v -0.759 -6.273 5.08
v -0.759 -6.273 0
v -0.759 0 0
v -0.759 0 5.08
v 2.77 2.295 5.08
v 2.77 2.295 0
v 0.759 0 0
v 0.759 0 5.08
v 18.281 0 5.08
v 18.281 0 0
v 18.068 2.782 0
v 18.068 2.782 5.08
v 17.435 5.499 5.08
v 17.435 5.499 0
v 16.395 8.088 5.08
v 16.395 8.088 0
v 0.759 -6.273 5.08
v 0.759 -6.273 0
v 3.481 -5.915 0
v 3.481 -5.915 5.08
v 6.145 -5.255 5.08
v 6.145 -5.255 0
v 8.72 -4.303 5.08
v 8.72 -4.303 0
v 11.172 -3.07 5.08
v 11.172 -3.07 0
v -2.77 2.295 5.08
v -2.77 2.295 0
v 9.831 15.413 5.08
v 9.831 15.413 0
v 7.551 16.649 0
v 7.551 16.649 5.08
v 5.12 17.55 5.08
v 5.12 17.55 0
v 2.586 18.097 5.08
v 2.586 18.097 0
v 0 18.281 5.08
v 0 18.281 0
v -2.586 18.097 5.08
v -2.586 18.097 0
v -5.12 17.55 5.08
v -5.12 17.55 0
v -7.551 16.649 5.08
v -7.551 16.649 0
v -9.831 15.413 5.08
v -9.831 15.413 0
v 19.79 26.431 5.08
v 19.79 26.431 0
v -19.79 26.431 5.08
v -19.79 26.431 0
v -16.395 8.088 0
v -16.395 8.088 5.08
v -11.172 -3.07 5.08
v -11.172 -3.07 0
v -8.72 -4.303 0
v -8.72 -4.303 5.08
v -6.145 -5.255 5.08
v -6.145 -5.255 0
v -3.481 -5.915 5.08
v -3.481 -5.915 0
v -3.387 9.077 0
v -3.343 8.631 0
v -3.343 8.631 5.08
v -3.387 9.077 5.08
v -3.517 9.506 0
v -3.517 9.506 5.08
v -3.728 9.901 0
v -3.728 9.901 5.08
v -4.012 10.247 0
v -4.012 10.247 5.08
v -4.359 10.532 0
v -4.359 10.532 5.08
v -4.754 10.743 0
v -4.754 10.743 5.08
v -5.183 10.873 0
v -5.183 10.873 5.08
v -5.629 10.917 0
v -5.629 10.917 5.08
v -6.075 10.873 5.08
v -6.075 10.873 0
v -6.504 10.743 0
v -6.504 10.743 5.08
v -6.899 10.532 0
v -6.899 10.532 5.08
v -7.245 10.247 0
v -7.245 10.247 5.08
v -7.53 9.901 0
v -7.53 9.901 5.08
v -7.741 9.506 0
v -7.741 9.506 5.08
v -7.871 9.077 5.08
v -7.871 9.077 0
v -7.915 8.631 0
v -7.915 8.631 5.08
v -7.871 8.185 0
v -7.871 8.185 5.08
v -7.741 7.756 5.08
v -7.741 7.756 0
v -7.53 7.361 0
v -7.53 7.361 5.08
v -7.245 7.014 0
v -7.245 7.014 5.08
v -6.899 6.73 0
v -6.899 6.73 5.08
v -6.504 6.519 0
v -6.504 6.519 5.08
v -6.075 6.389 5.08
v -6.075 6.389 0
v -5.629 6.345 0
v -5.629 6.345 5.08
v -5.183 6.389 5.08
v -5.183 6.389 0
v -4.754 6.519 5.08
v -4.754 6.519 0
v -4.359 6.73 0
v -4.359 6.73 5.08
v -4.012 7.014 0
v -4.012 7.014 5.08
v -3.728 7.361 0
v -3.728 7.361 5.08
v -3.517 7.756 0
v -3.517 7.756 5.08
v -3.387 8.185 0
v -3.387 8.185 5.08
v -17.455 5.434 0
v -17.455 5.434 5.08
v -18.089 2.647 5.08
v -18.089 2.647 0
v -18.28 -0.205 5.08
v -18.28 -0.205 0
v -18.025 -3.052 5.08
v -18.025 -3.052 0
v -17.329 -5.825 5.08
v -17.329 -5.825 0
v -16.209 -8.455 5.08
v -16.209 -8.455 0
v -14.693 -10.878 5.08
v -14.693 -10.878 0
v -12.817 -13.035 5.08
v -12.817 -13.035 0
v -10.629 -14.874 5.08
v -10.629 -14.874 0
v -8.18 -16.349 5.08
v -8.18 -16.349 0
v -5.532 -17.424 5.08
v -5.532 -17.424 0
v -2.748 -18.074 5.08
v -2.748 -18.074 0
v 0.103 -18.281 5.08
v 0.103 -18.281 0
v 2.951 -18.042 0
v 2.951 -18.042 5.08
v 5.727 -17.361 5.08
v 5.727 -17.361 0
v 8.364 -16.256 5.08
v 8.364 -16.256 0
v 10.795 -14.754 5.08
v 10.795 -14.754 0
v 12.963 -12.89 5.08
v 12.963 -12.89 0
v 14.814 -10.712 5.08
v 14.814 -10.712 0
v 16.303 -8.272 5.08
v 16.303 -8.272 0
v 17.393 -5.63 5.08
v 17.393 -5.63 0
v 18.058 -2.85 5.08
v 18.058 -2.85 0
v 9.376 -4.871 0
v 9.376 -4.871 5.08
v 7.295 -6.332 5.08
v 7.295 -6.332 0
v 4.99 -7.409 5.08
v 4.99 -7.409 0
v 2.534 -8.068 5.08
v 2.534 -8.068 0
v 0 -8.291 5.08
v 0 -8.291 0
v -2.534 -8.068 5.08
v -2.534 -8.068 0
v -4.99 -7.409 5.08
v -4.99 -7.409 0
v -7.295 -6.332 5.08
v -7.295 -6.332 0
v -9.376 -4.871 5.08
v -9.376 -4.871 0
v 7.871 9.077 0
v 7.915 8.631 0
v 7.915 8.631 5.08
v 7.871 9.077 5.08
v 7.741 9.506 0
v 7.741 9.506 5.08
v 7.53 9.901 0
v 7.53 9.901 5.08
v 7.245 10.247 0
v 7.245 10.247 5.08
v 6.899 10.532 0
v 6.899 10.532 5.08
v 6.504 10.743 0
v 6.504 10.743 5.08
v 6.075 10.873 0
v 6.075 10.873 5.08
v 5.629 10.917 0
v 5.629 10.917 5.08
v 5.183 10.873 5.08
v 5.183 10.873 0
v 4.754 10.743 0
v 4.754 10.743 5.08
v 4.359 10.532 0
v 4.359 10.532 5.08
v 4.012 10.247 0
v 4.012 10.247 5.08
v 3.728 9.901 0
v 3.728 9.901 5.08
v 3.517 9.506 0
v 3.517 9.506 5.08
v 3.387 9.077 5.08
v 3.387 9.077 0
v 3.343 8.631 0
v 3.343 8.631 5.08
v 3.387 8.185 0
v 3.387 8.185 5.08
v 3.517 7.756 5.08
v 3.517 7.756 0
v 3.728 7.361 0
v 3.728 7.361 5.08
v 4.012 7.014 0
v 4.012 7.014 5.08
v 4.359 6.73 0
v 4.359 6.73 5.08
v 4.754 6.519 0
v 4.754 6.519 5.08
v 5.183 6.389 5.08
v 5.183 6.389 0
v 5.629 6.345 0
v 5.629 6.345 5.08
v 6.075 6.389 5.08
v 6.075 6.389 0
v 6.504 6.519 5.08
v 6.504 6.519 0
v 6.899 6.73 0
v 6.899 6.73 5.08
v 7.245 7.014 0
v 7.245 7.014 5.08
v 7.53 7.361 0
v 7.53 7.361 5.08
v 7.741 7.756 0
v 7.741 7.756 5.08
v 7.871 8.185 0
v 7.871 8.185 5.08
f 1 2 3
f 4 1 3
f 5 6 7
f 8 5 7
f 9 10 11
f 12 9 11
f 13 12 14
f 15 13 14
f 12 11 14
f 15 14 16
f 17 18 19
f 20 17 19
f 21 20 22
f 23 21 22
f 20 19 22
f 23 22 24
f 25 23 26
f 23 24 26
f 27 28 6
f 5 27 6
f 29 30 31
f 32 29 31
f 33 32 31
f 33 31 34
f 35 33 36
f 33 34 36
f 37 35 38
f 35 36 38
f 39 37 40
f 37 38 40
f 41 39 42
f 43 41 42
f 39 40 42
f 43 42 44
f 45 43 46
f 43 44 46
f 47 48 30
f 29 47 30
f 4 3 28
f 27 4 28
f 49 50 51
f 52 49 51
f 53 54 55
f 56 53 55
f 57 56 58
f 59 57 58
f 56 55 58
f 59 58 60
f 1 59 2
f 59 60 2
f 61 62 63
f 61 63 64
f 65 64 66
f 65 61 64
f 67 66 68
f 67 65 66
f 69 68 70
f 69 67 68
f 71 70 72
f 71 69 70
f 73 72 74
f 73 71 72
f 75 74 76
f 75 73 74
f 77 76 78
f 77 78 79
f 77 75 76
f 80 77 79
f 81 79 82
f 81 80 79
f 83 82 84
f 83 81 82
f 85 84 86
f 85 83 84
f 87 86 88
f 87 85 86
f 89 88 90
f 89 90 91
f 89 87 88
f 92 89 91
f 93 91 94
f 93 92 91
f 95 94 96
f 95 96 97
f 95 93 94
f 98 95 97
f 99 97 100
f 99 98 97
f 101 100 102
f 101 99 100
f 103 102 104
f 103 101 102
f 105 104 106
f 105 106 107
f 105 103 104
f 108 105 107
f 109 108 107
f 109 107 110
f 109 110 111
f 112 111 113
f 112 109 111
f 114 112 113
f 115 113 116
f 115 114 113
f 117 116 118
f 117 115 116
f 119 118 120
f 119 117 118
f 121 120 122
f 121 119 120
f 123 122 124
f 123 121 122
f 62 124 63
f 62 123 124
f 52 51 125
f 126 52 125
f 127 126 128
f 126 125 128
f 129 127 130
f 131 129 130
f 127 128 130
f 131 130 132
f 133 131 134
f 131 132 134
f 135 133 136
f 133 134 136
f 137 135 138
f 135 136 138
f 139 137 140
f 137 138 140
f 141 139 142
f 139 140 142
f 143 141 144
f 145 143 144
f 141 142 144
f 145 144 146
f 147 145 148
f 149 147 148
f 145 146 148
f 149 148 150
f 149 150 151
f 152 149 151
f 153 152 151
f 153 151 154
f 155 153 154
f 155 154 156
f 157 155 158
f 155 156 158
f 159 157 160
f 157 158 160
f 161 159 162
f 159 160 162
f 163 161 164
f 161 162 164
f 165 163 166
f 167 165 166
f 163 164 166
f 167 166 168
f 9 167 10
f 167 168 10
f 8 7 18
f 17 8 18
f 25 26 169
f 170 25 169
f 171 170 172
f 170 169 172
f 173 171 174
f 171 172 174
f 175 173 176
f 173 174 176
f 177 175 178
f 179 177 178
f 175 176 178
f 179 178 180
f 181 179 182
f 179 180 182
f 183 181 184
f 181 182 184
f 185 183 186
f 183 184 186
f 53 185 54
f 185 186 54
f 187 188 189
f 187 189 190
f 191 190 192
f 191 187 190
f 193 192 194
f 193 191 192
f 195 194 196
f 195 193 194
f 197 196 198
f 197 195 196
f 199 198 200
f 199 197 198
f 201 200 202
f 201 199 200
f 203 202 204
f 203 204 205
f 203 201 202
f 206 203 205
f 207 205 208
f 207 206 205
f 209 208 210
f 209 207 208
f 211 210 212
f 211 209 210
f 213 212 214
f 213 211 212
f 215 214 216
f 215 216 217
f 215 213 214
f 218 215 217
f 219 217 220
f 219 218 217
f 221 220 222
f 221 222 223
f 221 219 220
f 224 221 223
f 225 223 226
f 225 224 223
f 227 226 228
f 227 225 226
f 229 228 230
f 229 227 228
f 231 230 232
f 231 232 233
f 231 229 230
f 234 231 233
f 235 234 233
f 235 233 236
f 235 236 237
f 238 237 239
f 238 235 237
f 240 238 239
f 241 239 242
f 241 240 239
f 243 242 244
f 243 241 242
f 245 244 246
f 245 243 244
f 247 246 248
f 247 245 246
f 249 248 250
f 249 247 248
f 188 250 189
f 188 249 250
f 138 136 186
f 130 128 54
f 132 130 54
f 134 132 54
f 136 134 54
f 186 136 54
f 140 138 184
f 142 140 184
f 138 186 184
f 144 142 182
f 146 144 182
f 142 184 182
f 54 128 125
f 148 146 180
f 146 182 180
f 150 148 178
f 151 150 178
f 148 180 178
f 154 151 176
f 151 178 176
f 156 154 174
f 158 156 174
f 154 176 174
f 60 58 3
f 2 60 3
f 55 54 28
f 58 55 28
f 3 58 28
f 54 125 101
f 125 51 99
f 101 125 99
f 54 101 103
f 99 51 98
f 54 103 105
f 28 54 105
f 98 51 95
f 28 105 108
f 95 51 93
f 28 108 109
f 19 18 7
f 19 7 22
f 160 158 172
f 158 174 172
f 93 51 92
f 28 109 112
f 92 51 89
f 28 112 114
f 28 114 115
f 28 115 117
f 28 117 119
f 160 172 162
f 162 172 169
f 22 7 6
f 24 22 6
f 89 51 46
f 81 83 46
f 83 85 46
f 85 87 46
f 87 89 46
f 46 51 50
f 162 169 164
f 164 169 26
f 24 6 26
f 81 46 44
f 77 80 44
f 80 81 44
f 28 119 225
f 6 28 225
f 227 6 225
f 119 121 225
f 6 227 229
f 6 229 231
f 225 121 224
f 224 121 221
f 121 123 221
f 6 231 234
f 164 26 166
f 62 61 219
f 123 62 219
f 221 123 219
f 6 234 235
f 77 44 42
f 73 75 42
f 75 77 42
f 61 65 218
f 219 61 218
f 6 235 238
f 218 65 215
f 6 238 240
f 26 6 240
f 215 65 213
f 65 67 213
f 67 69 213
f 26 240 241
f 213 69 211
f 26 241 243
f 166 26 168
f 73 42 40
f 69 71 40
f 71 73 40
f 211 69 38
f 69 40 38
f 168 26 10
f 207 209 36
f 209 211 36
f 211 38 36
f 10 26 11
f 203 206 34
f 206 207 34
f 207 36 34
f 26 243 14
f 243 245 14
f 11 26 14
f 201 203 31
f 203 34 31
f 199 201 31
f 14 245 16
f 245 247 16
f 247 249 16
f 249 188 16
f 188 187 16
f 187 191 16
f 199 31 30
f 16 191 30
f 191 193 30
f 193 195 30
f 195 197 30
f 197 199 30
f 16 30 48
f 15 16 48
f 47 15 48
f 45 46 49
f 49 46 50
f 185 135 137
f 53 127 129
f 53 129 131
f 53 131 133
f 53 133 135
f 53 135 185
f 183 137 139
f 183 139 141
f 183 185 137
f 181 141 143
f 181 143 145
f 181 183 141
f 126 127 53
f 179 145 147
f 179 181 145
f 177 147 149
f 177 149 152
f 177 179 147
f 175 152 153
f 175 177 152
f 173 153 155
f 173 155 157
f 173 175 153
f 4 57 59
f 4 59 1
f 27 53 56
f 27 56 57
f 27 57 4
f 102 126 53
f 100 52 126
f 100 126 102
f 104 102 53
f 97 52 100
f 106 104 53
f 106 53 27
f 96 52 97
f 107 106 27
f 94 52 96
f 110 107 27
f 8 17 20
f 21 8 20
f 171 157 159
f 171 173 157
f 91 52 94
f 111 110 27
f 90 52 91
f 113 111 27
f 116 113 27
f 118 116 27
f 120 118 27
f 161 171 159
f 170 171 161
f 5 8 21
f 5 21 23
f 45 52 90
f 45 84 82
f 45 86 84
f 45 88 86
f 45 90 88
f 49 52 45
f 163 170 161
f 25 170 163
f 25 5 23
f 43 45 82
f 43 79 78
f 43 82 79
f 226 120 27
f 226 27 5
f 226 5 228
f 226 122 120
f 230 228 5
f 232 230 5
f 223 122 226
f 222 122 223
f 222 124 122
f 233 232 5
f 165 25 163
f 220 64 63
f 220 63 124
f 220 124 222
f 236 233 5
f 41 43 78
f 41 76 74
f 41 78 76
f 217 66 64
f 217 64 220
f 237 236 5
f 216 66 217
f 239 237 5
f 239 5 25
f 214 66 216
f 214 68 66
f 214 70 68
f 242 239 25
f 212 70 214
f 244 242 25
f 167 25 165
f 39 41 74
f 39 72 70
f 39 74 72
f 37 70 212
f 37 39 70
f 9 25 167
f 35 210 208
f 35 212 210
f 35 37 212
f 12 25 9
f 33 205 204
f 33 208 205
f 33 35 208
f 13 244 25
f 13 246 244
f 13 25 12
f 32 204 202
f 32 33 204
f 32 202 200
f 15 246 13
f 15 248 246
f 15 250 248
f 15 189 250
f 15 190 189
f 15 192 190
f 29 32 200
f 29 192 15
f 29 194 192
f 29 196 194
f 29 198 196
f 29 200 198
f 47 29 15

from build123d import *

# Parameters (mm, degrees)
F0_R     = 2.286
F1_DEPTH = 5.08


with BuildPart() as f1:
    # F0 (on Top) → F1 (new body)
    with BuildSketch(Plane.XY):
        with BuildLine():
            ThreePointArc((-16.394592, 8.088413), (-4.15277, -17.803359), (18.281277, 0))
            ThreePointArc((18.281277, 0), (17.803359, 4.15277), (16.394592, 8.088413))
            ThreePointArc((16.394592, 8.088413), (13.614491, 12.200439), (9.830724, 15.413044))
            ThreePointArc((9.830724, 15.413044), (0, 18.281277), (-9.830724, 15.413044))
            ThreePointArc((-9.830724, 15.413044), (-13.614491, 12.200439), (-16.394592, 8.088413))
        make_face()
        with BuildLine():
            ThreePointArc((11.172347, -3.07006), (0, -8.290545), (-11.172347, -3.07006))
            ThreePointArc((-11.172347, -3.07006), (-6.145377, -5.255343), (-0.75922, -6.272794))
            Line((-0.75922, -6.272794), (-0.75922, 0))
            Line((-0.75922, 0), (-2.770182, 2.295201))
            Line((-2.770182, 2.295201), (2.770182, 2.295201))
            Line((2.770182, 2.295201), (0.75922, 0))
            Line((0.75922, 0), (0.75922, -6.272794))
            ThreePointArc((0.75922, -6.272794), (6.145377, -5.255343), (11.172347, -3.07006))
        make_face(mode=Mode.SUBTRACT)
        with Locations((-5.628771, 8.630777)):
            Circle(F0_R, mode=Mode.SUBTRACT)
        with Locations((5.628771, 8.630777)):
            Circle(F0_R, mode=Mode.SUBTRACT)
        with BuildLine():
            ThreePointArc((9.830724, 15.413044), (13.614491, 12.200439), (16.394592, 8.088413))
            Line((16.394592, 8.088413), (19.790254, 26.43105))
            Line((19.790254, 26.43105), (9.830724, 15.413044))
        make_face()
        with BuildLine():
            Line((-19.790254, 26.43105), (-16.394592, 8.088413))
            ThreePointArc((-16.394592, 8.088413), (-13.614491, 12.200439), (-9.830724, 15.413044))
            Line((-9.830724, 15.413044), (-19.790254, 26.43105))
        make_face()
    extrude(amount=F1_DEPTH)


solid = f1.part
